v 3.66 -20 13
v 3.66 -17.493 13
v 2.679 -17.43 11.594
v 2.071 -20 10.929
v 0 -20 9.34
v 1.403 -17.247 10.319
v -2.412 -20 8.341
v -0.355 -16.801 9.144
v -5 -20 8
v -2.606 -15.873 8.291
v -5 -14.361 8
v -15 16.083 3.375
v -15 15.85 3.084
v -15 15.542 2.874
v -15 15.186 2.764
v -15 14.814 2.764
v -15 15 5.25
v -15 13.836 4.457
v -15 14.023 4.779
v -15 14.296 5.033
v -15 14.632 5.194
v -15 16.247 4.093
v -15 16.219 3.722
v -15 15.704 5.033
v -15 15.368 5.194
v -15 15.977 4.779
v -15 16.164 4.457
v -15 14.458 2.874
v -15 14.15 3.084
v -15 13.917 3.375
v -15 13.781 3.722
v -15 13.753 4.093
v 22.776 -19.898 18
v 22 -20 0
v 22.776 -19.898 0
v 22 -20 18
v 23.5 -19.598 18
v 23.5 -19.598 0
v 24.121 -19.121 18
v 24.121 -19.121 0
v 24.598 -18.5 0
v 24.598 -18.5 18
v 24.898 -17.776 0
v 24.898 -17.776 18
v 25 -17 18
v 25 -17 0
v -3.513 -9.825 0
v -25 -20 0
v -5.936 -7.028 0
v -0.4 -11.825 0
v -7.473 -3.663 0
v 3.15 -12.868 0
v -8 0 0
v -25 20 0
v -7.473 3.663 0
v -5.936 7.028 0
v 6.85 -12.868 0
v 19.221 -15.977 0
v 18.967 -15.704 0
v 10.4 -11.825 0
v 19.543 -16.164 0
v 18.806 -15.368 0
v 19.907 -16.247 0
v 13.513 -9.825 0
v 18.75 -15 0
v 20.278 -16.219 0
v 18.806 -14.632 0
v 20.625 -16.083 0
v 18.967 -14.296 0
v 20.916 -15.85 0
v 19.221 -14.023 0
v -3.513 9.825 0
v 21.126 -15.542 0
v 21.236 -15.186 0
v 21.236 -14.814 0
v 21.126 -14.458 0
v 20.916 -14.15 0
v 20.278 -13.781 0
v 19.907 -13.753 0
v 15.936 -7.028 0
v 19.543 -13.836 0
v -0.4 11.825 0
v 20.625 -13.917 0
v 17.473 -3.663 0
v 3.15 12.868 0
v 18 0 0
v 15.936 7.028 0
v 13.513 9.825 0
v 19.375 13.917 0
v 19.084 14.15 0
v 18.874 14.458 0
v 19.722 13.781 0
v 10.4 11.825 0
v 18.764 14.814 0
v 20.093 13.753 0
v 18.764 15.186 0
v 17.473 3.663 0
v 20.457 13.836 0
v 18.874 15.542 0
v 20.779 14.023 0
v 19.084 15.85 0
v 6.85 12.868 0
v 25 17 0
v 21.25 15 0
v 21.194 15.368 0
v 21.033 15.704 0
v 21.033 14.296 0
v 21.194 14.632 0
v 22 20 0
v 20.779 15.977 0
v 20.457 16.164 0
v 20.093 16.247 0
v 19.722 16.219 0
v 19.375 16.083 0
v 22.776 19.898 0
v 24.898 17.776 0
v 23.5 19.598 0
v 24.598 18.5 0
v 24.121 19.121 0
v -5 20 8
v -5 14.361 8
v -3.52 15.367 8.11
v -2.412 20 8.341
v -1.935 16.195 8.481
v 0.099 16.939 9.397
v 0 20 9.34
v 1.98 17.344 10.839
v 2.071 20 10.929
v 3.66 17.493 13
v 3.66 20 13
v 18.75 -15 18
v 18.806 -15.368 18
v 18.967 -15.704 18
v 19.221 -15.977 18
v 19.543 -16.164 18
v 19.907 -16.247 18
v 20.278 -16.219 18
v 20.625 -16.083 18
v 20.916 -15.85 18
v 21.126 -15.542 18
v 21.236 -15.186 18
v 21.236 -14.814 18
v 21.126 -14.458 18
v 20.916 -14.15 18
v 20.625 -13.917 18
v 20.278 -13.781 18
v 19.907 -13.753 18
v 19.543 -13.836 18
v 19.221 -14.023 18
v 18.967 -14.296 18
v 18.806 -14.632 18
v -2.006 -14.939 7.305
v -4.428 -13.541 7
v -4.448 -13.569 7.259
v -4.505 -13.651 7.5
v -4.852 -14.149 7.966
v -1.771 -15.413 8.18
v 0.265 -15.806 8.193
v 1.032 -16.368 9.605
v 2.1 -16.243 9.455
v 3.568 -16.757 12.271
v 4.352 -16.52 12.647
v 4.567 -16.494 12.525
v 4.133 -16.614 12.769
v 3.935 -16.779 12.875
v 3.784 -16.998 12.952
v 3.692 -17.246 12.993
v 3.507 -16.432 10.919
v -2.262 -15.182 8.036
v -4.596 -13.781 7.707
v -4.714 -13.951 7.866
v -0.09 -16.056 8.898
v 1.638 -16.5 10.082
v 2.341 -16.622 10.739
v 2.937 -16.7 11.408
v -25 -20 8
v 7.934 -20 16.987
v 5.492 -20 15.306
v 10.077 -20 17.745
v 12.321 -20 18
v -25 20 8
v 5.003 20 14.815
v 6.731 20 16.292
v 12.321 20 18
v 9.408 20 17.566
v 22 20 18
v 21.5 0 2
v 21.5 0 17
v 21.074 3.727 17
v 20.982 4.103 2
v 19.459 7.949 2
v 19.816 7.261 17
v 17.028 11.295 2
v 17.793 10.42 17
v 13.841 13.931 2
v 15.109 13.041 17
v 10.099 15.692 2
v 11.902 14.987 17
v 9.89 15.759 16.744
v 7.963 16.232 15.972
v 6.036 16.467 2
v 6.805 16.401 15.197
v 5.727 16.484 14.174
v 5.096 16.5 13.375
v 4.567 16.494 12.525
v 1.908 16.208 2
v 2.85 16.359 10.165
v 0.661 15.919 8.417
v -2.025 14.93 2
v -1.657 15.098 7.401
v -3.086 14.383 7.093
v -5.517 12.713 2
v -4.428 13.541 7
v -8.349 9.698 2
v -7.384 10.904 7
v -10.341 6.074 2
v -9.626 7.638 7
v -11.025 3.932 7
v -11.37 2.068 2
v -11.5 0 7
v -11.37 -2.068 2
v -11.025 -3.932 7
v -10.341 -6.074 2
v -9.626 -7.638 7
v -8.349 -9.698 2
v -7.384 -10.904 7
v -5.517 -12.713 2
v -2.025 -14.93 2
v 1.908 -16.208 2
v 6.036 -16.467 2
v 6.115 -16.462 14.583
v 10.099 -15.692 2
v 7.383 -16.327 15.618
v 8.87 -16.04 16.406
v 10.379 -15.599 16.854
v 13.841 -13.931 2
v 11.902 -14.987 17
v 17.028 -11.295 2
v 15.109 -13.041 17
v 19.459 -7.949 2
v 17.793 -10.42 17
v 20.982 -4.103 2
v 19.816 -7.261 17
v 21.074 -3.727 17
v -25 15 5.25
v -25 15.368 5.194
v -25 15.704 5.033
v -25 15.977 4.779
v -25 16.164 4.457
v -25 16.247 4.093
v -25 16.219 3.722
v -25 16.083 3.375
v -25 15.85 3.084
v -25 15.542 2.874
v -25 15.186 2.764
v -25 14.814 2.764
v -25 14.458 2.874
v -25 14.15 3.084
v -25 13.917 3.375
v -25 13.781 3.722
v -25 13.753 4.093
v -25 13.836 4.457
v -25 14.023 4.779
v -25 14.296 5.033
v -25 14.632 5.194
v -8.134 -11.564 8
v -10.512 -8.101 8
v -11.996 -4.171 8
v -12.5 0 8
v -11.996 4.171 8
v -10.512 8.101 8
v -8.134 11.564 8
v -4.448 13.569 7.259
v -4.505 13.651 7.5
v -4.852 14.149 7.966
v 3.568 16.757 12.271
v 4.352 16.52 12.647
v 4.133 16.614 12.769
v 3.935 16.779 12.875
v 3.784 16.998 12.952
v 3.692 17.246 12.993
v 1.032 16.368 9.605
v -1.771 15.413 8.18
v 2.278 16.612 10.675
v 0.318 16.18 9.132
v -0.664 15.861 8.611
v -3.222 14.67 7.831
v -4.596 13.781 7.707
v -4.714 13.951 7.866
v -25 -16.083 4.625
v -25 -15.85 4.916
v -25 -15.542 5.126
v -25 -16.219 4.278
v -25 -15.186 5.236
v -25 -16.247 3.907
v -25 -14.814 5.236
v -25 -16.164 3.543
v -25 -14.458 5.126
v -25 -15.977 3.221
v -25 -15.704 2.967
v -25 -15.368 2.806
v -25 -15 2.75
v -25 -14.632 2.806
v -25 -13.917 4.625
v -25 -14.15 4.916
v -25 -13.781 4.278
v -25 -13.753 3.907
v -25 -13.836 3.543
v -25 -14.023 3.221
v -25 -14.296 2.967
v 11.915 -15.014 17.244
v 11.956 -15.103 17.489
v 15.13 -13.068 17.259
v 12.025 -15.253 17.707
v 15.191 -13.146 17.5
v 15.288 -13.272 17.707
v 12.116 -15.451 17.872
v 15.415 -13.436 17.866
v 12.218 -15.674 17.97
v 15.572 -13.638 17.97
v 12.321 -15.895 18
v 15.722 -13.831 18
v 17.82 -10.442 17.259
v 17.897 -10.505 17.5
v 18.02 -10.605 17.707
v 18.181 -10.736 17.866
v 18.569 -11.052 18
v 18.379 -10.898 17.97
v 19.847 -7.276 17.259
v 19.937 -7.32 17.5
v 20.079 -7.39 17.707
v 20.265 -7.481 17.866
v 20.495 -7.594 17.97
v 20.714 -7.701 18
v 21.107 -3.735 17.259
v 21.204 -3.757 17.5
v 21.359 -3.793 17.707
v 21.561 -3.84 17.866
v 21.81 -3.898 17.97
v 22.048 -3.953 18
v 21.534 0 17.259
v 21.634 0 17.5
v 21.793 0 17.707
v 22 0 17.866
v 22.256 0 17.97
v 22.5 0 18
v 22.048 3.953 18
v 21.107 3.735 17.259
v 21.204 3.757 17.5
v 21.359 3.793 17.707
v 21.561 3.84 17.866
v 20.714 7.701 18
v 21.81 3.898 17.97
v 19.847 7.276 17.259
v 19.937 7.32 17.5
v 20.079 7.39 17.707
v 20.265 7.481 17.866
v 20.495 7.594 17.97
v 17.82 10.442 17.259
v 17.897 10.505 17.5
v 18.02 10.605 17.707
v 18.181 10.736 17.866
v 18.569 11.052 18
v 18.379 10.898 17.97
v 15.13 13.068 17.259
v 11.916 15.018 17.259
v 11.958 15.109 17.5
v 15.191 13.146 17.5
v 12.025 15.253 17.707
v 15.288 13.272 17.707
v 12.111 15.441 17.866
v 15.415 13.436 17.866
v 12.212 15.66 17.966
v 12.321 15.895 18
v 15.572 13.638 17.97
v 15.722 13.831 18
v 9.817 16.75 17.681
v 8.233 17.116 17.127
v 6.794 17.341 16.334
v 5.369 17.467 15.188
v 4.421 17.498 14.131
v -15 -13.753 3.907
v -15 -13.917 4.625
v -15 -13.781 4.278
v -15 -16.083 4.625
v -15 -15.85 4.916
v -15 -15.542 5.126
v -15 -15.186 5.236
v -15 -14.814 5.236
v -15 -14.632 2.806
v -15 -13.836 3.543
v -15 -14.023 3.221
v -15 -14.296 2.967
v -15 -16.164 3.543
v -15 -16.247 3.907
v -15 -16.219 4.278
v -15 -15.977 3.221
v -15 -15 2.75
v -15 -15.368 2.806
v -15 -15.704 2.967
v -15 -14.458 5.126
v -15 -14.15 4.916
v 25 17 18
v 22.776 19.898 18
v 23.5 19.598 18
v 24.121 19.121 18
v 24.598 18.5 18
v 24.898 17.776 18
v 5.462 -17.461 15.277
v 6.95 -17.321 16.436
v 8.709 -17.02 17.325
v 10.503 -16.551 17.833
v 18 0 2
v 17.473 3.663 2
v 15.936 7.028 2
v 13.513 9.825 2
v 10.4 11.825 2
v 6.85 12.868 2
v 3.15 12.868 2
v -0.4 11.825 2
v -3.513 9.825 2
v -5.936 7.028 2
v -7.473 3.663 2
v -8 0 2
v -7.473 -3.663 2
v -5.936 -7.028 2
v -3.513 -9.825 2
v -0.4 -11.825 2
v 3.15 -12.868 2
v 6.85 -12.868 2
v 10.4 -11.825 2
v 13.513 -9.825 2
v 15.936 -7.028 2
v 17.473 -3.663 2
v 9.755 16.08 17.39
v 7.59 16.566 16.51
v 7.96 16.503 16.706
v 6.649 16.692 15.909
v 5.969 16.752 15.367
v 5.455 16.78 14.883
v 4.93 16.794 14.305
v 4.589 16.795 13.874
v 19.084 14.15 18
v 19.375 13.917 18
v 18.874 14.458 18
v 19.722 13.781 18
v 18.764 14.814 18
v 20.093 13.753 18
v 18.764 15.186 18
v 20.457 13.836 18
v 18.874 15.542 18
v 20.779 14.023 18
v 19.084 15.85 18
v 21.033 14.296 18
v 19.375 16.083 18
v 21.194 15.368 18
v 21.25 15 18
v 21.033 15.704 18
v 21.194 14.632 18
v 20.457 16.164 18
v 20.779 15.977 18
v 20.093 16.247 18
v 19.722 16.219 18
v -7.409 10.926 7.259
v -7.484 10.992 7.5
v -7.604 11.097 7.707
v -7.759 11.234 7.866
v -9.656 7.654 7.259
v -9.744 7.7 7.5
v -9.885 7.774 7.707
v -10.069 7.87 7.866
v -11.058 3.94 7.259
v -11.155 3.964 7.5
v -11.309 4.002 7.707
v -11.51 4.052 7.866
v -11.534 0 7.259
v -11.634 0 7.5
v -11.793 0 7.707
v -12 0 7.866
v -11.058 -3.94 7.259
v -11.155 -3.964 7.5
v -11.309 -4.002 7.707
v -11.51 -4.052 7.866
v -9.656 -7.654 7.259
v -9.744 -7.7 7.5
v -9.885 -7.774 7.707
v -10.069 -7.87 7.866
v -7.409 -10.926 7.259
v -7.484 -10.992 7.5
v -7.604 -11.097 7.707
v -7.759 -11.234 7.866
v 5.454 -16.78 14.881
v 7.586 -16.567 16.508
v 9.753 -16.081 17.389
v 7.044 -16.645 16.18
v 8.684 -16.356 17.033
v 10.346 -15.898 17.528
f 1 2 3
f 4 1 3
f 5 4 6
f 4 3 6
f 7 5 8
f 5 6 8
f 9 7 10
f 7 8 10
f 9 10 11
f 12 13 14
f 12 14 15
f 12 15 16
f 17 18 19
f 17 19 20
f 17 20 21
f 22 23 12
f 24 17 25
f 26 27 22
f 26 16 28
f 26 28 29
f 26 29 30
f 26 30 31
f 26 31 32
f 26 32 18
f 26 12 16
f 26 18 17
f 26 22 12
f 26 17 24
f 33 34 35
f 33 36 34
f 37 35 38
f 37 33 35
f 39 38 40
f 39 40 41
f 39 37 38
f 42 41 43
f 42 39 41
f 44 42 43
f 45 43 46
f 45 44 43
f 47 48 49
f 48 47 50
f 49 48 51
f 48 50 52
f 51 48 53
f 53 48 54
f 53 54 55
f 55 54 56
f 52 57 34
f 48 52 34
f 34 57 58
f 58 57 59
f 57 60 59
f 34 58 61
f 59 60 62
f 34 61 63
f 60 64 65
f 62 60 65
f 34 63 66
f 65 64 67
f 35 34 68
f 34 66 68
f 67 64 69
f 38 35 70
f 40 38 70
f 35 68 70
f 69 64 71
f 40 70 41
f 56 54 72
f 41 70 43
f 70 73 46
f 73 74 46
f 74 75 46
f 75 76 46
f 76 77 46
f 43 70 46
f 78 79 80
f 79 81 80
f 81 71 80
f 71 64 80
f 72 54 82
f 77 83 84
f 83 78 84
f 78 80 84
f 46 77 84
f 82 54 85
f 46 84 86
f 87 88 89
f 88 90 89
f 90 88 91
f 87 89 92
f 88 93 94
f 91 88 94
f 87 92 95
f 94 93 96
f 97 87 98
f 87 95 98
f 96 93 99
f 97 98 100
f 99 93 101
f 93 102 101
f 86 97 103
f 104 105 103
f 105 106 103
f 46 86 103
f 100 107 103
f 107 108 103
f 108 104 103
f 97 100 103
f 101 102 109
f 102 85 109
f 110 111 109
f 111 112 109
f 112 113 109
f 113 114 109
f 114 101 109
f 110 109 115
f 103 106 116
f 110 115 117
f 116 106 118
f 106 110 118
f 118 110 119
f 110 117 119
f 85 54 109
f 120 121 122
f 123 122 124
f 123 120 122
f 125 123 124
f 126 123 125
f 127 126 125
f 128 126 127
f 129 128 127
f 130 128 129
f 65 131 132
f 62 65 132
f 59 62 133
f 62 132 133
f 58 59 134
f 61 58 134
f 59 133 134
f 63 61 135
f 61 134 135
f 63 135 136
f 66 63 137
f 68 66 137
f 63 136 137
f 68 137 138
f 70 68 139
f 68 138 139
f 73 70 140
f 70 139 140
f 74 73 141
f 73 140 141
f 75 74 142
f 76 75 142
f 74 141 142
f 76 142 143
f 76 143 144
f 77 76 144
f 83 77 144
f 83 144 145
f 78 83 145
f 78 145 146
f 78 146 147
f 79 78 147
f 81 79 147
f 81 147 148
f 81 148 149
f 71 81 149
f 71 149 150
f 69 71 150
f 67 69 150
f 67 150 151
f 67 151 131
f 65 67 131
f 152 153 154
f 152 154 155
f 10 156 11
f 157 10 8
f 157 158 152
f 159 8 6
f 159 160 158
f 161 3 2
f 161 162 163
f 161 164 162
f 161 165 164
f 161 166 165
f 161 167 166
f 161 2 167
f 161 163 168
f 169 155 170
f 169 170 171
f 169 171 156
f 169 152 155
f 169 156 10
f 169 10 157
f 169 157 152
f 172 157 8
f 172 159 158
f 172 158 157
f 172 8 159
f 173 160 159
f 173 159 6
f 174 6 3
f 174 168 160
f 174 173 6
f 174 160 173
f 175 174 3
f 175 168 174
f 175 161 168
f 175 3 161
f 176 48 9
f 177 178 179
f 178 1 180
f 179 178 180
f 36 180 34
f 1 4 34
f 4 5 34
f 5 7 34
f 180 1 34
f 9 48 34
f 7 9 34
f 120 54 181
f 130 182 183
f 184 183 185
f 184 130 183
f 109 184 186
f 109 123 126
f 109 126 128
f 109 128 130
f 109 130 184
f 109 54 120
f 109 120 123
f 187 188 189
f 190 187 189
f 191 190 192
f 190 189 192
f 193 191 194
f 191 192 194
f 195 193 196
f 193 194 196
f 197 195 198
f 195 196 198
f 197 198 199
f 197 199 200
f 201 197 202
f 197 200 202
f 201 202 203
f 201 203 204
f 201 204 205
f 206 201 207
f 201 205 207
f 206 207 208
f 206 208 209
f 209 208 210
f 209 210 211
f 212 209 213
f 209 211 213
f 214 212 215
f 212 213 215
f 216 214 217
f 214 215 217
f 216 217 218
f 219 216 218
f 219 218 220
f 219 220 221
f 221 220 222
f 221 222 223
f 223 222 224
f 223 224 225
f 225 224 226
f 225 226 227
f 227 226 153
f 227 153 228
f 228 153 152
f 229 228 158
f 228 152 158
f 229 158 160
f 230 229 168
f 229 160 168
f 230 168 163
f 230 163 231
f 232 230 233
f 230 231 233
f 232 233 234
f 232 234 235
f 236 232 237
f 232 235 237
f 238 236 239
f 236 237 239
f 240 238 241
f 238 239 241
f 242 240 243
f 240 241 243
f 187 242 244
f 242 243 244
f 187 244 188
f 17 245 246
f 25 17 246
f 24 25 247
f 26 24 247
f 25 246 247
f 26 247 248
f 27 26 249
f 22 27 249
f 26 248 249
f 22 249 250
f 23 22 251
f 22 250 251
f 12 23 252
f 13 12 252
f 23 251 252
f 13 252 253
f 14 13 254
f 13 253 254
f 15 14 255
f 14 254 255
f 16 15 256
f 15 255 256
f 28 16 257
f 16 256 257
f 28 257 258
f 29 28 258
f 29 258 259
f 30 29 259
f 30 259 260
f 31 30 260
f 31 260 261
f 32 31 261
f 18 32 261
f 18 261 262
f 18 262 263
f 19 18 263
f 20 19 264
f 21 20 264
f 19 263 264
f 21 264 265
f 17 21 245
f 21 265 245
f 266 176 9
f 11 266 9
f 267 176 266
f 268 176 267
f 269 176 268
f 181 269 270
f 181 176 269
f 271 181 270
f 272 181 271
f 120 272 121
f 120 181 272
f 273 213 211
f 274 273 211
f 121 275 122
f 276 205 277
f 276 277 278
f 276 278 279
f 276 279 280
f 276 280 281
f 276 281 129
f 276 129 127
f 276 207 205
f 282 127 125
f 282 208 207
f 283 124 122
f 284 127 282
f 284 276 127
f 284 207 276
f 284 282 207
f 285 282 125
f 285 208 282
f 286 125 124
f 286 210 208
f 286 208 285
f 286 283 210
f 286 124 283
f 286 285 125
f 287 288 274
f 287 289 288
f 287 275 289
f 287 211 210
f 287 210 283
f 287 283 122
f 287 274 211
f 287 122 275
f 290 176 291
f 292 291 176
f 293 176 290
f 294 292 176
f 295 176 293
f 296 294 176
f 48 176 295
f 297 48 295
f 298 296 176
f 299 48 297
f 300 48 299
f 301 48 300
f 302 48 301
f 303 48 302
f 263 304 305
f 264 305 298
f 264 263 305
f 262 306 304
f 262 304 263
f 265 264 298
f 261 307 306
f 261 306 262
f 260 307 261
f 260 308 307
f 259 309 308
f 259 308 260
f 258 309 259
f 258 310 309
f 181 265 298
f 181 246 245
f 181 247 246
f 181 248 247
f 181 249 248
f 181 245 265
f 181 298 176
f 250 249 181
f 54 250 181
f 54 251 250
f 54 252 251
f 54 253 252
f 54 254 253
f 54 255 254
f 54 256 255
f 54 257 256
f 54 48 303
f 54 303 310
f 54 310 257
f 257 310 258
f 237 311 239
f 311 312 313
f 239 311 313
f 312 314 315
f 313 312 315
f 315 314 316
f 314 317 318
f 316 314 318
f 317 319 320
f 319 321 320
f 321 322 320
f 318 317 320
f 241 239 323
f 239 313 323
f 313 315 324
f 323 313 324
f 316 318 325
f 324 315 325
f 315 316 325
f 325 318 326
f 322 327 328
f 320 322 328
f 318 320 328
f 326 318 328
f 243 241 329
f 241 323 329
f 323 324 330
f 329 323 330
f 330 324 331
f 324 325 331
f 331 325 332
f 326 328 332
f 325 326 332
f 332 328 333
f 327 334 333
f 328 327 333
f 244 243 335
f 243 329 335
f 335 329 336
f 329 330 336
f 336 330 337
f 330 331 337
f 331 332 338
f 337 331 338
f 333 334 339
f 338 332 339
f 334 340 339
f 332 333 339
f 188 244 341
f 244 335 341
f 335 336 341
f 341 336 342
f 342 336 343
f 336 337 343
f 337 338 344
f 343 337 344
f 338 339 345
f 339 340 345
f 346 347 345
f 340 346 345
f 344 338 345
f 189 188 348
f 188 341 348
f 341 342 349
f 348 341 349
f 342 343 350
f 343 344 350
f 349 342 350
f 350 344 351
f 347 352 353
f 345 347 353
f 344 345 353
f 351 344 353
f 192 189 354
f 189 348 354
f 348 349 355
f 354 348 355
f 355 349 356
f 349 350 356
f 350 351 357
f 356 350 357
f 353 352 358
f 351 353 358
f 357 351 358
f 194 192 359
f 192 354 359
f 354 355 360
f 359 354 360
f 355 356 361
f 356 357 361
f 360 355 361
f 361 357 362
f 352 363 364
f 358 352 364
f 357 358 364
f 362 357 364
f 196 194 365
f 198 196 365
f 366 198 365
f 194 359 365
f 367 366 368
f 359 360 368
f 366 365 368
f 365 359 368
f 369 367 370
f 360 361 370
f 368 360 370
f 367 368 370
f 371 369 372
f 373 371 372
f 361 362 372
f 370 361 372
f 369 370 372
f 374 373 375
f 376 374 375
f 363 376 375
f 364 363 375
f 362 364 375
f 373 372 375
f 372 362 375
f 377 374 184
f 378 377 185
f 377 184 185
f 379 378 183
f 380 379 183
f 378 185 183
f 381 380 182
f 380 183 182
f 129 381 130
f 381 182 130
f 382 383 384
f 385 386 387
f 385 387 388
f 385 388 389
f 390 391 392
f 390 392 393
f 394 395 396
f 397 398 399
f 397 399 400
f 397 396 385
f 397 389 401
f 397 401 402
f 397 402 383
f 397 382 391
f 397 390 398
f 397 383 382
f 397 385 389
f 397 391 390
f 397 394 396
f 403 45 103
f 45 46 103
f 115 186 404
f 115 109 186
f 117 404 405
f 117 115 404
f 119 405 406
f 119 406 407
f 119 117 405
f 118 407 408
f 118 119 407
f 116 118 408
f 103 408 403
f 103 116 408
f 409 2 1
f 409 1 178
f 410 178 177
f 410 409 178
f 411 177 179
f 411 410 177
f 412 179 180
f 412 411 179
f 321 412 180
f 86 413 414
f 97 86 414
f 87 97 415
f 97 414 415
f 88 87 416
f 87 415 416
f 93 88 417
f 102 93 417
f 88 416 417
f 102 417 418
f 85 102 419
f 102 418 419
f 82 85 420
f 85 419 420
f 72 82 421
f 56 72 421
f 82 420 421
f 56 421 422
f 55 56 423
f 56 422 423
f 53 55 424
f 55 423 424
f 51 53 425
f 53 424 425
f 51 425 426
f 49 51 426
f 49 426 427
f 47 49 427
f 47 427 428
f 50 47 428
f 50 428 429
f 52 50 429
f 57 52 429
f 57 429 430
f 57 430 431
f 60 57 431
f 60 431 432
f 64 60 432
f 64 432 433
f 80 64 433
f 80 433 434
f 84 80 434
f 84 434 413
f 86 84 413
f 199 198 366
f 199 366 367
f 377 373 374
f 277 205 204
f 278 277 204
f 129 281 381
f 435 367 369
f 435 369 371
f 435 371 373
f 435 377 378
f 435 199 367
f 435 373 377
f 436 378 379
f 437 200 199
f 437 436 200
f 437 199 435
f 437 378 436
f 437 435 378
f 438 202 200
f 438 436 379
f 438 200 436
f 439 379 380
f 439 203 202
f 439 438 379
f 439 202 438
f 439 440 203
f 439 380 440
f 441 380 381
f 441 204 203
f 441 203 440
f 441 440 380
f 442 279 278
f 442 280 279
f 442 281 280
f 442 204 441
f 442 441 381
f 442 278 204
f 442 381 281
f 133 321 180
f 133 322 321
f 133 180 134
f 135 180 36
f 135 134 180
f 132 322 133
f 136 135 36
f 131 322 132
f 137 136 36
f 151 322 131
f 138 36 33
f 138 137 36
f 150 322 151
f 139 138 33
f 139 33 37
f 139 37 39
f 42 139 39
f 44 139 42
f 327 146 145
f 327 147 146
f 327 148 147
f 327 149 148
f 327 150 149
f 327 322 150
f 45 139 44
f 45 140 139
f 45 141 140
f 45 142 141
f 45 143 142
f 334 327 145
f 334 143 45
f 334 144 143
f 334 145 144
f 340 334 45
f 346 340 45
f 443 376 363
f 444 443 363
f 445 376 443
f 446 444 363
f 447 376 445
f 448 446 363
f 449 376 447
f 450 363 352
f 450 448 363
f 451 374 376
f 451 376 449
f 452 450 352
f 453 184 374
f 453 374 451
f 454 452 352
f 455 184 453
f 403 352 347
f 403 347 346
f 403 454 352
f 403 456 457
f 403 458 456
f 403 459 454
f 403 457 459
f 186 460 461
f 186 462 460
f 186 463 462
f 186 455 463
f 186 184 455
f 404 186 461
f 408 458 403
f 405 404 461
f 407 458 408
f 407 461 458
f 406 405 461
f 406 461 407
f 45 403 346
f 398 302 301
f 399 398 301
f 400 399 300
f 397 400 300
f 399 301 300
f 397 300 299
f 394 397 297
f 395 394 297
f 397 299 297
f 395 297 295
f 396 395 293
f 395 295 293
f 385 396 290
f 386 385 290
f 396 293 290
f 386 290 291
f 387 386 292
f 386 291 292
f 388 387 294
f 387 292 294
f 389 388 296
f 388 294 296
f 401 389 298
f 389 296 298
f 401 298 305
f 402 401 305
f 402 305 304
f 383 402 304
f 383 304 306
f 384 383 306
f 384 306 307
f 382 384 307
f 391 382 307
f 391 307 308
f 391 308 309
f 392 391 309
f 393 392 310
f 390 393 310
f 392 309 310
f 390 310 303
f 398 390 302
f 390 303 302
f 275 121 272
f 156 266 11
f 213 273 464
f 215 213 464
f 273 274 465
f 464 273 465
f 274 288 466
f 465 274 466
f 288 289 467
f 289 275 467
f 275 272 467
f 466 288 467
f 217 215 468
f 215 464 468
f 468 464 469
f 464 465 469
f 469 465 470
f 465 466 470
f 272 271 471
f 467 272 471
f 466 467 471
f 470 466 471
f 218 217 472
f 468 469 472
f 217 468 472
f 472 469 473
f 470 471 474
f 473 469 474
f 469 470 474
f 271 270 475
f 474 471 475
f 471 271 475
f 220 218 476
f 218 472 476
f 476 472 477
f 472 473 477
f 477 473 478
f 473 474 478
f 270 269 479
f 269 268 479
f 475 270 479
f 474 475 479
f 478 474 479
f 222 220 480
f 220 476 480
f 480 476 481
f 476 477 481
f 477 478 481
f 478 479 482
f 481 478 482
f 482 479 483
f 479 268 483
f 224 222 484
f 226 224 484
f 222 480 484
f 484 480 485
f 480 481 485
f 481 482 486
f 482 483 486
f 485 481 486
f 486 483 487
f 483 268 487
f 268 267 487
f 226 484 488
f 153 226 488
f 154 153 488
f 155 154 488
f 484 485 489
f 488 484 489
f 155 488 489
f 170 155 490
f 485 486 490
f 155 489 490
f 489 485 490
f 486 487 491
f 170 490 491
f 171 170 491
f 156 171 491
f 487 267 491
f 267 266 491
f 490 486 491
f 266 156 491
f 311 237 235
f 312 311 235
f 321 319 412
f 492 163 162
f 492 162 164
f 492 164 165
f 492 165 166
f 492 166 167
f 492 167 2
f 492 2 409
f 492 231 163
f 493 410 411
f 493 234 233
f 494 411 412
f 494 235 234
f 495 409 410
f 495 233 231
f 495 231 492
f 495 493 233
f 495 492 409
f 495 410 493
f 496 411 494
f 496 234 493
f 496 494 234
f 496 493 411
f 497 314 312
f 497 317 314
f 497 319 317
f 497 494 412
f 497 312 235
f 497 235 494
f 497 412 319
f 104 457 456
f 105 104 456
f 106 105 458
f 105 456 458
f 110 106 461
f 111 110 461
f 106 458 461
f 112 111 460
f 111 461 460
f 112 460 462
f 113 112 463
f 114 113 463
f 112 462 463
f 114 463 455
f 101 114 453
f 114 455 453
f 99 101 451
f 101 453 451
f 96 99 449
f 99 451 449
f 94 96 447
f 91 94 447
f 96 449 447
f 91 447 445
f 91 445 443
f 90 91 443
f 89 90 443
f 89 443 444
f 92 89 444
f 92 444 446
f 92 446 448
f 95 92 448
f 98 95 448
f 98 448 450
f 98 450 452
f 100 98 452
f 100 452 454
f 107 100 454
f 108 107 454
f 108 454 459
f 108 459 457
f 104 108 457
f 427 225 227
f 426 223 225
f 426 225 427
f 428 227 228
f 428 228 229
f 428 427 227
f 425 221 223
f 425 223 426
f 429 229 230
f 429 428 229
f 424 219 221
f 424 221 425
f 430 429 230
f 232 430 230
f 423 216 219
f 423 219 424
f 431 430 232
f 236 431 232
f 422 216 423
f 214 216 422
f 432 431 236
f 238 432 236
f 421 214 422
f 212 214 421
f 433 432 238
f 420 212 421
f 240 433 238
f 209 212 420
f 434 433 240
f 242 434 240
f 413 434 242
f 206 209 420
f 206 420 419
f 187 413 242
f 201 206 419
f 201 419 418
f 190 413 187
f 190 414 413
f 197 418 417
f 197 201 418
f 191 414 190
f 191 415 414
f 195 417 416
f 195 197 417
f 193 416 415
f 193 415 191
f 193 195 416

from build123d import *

# Parameters (mm, degrees)
SKETCH_1_W          = 50
SKETCH_1_H          = 40
EXTRUDE_1_DEPTH     = 8
SKETCH_2_W          = 20
SKETCH_2_H          = 40
EXTRUDE_2_DEPTH     = 10
SKETCH_3_R          = 16.5
CUT_EXTRUDE_1_DEPTH = 16
SKETCH_5_R          = 1.25
CUT_EXTRUDE_2_DEPTH = 37.728735344
SKETCH_6_R          = 1.25
CUT_EXTRUDE_3_DEPTH = 10
FILLET_1_R          = 10
FILLET_2_R          = 10
FILLET_3_R          = 3
SKETCH_7_R          = 13
CUT_EXTRUDE_4_DEPTH = 36.791060507
FILLET_4_R          = 1


with BuildPart() as part:
    # 草图1 → 凸台-拉伸1 (new body)
    with BuildSketch(Plane.XY):
        Rectangle(SKETCH_1_W, SKETCH_1_H)
    extrude(amount=EXTRUDE_1_DEPTH)

    # 草图2 → 凸台-拉伸2 (add)
    with BuildSketch(Plane.XY.offset(8)):
        with Locations((15, 0)):
            Rectangle(SKETCH_2_W, SKETCH_2_H)
    extrude(amount=EXTRUDE_2_DEPTH)

    # 草图3 → 切除-拉伸1 (cut)
    with BuildSketch(Plane.XY.offset(18)):
        with Locations((5, 0)):
            Circle(SKETCH_3_R)
    extrude(amount=-CUT_EXTRUDE_1_DEPTH, mode=Mode.SUBTRACT)

    # 草图5 → 切除-拉伸2 (cut, through all)
    with BuildSketch(Plane.XY.offset(18)):
        with Locations((20, 15)):
            Circle(SKETCH_5_R)
        with Locations(Location((20, -15, 0), (0, 0, 180))):
            Circle(SKETCH_5_R)
    extrude(amount=-CUT_EXTRUDE_2_DEPTH, mode=Mode.SUBTRACT)

    # 草图6 → 切除-拉伸3 (cut)
    with BuildSketch(Plane.ZY.offset(25)):
        with Locations((4, 15)):
            Circle(SKETCH_6_R)
        with Locations(Location((4, -15, 0), (0, 0, 180))):
            Circle(SKETCH_6_R)
    extrude(amount=-CUT_EXTRUDE_3_DEPTH, mode=Mode.SUBTRACT)

    # 圆角1
    fillet_1_edges = [part.edges().sort_by_distance(p)[0] for p in [
        (5, -18.25, 8),
        (5, 18.25, 8),
    ]]
    fillet(fillet_1_edges, radius=FILLET_1_R - 0.0001)  # a hair under: the kernel refuses the full size

    # 圆角2
    fillet_2_edges = [part.edges().sort_by_distance(p)[0] for p in [
        (5, -18.25, 18),
        (5, 18.25, 18),
    ]]
    fillet(fillet_2_edges, radius=FILLET_2_R)

    # 圆角3
    fillet_3_edges = [part.edges().sort_by_distance(p)[0] for p in [
        (25, -20, 9),
        (25, 20, 9),
    ]]
    fillet(fillet_3_edges, radius=FILLET_3_R)

    # 草图7 → 切除-拉伸4 (cut, through all)
    with BuildSketch(Plane.XY.offset(2)):
        with Locations((5, 0)):
            Circle(SKETCH_7_R)
    extrude(amount=-CUT_EXTRUDE_4_DEPTH, mode=Mode.SUBTRACT)

    # 圆角4
    fillet_4_edges = [part.edges().sort_by_distance(p)[0] for p in [
        (-11.5, 0, 8),
        (-0.245631372, -15.643955751, 9.202461182),
        (19.018542731, -8.702324959, 18),
        (-0.245631372, 15.643955751, 9.202461182),
        (7.42567519, 16.320726083, 16.720103053),
        (7.42567519, -16.320726083, 16.720103053),
    ]]
    fillet(fillet_4_edges, radius=FILLET_4_R)


solid = part.part
